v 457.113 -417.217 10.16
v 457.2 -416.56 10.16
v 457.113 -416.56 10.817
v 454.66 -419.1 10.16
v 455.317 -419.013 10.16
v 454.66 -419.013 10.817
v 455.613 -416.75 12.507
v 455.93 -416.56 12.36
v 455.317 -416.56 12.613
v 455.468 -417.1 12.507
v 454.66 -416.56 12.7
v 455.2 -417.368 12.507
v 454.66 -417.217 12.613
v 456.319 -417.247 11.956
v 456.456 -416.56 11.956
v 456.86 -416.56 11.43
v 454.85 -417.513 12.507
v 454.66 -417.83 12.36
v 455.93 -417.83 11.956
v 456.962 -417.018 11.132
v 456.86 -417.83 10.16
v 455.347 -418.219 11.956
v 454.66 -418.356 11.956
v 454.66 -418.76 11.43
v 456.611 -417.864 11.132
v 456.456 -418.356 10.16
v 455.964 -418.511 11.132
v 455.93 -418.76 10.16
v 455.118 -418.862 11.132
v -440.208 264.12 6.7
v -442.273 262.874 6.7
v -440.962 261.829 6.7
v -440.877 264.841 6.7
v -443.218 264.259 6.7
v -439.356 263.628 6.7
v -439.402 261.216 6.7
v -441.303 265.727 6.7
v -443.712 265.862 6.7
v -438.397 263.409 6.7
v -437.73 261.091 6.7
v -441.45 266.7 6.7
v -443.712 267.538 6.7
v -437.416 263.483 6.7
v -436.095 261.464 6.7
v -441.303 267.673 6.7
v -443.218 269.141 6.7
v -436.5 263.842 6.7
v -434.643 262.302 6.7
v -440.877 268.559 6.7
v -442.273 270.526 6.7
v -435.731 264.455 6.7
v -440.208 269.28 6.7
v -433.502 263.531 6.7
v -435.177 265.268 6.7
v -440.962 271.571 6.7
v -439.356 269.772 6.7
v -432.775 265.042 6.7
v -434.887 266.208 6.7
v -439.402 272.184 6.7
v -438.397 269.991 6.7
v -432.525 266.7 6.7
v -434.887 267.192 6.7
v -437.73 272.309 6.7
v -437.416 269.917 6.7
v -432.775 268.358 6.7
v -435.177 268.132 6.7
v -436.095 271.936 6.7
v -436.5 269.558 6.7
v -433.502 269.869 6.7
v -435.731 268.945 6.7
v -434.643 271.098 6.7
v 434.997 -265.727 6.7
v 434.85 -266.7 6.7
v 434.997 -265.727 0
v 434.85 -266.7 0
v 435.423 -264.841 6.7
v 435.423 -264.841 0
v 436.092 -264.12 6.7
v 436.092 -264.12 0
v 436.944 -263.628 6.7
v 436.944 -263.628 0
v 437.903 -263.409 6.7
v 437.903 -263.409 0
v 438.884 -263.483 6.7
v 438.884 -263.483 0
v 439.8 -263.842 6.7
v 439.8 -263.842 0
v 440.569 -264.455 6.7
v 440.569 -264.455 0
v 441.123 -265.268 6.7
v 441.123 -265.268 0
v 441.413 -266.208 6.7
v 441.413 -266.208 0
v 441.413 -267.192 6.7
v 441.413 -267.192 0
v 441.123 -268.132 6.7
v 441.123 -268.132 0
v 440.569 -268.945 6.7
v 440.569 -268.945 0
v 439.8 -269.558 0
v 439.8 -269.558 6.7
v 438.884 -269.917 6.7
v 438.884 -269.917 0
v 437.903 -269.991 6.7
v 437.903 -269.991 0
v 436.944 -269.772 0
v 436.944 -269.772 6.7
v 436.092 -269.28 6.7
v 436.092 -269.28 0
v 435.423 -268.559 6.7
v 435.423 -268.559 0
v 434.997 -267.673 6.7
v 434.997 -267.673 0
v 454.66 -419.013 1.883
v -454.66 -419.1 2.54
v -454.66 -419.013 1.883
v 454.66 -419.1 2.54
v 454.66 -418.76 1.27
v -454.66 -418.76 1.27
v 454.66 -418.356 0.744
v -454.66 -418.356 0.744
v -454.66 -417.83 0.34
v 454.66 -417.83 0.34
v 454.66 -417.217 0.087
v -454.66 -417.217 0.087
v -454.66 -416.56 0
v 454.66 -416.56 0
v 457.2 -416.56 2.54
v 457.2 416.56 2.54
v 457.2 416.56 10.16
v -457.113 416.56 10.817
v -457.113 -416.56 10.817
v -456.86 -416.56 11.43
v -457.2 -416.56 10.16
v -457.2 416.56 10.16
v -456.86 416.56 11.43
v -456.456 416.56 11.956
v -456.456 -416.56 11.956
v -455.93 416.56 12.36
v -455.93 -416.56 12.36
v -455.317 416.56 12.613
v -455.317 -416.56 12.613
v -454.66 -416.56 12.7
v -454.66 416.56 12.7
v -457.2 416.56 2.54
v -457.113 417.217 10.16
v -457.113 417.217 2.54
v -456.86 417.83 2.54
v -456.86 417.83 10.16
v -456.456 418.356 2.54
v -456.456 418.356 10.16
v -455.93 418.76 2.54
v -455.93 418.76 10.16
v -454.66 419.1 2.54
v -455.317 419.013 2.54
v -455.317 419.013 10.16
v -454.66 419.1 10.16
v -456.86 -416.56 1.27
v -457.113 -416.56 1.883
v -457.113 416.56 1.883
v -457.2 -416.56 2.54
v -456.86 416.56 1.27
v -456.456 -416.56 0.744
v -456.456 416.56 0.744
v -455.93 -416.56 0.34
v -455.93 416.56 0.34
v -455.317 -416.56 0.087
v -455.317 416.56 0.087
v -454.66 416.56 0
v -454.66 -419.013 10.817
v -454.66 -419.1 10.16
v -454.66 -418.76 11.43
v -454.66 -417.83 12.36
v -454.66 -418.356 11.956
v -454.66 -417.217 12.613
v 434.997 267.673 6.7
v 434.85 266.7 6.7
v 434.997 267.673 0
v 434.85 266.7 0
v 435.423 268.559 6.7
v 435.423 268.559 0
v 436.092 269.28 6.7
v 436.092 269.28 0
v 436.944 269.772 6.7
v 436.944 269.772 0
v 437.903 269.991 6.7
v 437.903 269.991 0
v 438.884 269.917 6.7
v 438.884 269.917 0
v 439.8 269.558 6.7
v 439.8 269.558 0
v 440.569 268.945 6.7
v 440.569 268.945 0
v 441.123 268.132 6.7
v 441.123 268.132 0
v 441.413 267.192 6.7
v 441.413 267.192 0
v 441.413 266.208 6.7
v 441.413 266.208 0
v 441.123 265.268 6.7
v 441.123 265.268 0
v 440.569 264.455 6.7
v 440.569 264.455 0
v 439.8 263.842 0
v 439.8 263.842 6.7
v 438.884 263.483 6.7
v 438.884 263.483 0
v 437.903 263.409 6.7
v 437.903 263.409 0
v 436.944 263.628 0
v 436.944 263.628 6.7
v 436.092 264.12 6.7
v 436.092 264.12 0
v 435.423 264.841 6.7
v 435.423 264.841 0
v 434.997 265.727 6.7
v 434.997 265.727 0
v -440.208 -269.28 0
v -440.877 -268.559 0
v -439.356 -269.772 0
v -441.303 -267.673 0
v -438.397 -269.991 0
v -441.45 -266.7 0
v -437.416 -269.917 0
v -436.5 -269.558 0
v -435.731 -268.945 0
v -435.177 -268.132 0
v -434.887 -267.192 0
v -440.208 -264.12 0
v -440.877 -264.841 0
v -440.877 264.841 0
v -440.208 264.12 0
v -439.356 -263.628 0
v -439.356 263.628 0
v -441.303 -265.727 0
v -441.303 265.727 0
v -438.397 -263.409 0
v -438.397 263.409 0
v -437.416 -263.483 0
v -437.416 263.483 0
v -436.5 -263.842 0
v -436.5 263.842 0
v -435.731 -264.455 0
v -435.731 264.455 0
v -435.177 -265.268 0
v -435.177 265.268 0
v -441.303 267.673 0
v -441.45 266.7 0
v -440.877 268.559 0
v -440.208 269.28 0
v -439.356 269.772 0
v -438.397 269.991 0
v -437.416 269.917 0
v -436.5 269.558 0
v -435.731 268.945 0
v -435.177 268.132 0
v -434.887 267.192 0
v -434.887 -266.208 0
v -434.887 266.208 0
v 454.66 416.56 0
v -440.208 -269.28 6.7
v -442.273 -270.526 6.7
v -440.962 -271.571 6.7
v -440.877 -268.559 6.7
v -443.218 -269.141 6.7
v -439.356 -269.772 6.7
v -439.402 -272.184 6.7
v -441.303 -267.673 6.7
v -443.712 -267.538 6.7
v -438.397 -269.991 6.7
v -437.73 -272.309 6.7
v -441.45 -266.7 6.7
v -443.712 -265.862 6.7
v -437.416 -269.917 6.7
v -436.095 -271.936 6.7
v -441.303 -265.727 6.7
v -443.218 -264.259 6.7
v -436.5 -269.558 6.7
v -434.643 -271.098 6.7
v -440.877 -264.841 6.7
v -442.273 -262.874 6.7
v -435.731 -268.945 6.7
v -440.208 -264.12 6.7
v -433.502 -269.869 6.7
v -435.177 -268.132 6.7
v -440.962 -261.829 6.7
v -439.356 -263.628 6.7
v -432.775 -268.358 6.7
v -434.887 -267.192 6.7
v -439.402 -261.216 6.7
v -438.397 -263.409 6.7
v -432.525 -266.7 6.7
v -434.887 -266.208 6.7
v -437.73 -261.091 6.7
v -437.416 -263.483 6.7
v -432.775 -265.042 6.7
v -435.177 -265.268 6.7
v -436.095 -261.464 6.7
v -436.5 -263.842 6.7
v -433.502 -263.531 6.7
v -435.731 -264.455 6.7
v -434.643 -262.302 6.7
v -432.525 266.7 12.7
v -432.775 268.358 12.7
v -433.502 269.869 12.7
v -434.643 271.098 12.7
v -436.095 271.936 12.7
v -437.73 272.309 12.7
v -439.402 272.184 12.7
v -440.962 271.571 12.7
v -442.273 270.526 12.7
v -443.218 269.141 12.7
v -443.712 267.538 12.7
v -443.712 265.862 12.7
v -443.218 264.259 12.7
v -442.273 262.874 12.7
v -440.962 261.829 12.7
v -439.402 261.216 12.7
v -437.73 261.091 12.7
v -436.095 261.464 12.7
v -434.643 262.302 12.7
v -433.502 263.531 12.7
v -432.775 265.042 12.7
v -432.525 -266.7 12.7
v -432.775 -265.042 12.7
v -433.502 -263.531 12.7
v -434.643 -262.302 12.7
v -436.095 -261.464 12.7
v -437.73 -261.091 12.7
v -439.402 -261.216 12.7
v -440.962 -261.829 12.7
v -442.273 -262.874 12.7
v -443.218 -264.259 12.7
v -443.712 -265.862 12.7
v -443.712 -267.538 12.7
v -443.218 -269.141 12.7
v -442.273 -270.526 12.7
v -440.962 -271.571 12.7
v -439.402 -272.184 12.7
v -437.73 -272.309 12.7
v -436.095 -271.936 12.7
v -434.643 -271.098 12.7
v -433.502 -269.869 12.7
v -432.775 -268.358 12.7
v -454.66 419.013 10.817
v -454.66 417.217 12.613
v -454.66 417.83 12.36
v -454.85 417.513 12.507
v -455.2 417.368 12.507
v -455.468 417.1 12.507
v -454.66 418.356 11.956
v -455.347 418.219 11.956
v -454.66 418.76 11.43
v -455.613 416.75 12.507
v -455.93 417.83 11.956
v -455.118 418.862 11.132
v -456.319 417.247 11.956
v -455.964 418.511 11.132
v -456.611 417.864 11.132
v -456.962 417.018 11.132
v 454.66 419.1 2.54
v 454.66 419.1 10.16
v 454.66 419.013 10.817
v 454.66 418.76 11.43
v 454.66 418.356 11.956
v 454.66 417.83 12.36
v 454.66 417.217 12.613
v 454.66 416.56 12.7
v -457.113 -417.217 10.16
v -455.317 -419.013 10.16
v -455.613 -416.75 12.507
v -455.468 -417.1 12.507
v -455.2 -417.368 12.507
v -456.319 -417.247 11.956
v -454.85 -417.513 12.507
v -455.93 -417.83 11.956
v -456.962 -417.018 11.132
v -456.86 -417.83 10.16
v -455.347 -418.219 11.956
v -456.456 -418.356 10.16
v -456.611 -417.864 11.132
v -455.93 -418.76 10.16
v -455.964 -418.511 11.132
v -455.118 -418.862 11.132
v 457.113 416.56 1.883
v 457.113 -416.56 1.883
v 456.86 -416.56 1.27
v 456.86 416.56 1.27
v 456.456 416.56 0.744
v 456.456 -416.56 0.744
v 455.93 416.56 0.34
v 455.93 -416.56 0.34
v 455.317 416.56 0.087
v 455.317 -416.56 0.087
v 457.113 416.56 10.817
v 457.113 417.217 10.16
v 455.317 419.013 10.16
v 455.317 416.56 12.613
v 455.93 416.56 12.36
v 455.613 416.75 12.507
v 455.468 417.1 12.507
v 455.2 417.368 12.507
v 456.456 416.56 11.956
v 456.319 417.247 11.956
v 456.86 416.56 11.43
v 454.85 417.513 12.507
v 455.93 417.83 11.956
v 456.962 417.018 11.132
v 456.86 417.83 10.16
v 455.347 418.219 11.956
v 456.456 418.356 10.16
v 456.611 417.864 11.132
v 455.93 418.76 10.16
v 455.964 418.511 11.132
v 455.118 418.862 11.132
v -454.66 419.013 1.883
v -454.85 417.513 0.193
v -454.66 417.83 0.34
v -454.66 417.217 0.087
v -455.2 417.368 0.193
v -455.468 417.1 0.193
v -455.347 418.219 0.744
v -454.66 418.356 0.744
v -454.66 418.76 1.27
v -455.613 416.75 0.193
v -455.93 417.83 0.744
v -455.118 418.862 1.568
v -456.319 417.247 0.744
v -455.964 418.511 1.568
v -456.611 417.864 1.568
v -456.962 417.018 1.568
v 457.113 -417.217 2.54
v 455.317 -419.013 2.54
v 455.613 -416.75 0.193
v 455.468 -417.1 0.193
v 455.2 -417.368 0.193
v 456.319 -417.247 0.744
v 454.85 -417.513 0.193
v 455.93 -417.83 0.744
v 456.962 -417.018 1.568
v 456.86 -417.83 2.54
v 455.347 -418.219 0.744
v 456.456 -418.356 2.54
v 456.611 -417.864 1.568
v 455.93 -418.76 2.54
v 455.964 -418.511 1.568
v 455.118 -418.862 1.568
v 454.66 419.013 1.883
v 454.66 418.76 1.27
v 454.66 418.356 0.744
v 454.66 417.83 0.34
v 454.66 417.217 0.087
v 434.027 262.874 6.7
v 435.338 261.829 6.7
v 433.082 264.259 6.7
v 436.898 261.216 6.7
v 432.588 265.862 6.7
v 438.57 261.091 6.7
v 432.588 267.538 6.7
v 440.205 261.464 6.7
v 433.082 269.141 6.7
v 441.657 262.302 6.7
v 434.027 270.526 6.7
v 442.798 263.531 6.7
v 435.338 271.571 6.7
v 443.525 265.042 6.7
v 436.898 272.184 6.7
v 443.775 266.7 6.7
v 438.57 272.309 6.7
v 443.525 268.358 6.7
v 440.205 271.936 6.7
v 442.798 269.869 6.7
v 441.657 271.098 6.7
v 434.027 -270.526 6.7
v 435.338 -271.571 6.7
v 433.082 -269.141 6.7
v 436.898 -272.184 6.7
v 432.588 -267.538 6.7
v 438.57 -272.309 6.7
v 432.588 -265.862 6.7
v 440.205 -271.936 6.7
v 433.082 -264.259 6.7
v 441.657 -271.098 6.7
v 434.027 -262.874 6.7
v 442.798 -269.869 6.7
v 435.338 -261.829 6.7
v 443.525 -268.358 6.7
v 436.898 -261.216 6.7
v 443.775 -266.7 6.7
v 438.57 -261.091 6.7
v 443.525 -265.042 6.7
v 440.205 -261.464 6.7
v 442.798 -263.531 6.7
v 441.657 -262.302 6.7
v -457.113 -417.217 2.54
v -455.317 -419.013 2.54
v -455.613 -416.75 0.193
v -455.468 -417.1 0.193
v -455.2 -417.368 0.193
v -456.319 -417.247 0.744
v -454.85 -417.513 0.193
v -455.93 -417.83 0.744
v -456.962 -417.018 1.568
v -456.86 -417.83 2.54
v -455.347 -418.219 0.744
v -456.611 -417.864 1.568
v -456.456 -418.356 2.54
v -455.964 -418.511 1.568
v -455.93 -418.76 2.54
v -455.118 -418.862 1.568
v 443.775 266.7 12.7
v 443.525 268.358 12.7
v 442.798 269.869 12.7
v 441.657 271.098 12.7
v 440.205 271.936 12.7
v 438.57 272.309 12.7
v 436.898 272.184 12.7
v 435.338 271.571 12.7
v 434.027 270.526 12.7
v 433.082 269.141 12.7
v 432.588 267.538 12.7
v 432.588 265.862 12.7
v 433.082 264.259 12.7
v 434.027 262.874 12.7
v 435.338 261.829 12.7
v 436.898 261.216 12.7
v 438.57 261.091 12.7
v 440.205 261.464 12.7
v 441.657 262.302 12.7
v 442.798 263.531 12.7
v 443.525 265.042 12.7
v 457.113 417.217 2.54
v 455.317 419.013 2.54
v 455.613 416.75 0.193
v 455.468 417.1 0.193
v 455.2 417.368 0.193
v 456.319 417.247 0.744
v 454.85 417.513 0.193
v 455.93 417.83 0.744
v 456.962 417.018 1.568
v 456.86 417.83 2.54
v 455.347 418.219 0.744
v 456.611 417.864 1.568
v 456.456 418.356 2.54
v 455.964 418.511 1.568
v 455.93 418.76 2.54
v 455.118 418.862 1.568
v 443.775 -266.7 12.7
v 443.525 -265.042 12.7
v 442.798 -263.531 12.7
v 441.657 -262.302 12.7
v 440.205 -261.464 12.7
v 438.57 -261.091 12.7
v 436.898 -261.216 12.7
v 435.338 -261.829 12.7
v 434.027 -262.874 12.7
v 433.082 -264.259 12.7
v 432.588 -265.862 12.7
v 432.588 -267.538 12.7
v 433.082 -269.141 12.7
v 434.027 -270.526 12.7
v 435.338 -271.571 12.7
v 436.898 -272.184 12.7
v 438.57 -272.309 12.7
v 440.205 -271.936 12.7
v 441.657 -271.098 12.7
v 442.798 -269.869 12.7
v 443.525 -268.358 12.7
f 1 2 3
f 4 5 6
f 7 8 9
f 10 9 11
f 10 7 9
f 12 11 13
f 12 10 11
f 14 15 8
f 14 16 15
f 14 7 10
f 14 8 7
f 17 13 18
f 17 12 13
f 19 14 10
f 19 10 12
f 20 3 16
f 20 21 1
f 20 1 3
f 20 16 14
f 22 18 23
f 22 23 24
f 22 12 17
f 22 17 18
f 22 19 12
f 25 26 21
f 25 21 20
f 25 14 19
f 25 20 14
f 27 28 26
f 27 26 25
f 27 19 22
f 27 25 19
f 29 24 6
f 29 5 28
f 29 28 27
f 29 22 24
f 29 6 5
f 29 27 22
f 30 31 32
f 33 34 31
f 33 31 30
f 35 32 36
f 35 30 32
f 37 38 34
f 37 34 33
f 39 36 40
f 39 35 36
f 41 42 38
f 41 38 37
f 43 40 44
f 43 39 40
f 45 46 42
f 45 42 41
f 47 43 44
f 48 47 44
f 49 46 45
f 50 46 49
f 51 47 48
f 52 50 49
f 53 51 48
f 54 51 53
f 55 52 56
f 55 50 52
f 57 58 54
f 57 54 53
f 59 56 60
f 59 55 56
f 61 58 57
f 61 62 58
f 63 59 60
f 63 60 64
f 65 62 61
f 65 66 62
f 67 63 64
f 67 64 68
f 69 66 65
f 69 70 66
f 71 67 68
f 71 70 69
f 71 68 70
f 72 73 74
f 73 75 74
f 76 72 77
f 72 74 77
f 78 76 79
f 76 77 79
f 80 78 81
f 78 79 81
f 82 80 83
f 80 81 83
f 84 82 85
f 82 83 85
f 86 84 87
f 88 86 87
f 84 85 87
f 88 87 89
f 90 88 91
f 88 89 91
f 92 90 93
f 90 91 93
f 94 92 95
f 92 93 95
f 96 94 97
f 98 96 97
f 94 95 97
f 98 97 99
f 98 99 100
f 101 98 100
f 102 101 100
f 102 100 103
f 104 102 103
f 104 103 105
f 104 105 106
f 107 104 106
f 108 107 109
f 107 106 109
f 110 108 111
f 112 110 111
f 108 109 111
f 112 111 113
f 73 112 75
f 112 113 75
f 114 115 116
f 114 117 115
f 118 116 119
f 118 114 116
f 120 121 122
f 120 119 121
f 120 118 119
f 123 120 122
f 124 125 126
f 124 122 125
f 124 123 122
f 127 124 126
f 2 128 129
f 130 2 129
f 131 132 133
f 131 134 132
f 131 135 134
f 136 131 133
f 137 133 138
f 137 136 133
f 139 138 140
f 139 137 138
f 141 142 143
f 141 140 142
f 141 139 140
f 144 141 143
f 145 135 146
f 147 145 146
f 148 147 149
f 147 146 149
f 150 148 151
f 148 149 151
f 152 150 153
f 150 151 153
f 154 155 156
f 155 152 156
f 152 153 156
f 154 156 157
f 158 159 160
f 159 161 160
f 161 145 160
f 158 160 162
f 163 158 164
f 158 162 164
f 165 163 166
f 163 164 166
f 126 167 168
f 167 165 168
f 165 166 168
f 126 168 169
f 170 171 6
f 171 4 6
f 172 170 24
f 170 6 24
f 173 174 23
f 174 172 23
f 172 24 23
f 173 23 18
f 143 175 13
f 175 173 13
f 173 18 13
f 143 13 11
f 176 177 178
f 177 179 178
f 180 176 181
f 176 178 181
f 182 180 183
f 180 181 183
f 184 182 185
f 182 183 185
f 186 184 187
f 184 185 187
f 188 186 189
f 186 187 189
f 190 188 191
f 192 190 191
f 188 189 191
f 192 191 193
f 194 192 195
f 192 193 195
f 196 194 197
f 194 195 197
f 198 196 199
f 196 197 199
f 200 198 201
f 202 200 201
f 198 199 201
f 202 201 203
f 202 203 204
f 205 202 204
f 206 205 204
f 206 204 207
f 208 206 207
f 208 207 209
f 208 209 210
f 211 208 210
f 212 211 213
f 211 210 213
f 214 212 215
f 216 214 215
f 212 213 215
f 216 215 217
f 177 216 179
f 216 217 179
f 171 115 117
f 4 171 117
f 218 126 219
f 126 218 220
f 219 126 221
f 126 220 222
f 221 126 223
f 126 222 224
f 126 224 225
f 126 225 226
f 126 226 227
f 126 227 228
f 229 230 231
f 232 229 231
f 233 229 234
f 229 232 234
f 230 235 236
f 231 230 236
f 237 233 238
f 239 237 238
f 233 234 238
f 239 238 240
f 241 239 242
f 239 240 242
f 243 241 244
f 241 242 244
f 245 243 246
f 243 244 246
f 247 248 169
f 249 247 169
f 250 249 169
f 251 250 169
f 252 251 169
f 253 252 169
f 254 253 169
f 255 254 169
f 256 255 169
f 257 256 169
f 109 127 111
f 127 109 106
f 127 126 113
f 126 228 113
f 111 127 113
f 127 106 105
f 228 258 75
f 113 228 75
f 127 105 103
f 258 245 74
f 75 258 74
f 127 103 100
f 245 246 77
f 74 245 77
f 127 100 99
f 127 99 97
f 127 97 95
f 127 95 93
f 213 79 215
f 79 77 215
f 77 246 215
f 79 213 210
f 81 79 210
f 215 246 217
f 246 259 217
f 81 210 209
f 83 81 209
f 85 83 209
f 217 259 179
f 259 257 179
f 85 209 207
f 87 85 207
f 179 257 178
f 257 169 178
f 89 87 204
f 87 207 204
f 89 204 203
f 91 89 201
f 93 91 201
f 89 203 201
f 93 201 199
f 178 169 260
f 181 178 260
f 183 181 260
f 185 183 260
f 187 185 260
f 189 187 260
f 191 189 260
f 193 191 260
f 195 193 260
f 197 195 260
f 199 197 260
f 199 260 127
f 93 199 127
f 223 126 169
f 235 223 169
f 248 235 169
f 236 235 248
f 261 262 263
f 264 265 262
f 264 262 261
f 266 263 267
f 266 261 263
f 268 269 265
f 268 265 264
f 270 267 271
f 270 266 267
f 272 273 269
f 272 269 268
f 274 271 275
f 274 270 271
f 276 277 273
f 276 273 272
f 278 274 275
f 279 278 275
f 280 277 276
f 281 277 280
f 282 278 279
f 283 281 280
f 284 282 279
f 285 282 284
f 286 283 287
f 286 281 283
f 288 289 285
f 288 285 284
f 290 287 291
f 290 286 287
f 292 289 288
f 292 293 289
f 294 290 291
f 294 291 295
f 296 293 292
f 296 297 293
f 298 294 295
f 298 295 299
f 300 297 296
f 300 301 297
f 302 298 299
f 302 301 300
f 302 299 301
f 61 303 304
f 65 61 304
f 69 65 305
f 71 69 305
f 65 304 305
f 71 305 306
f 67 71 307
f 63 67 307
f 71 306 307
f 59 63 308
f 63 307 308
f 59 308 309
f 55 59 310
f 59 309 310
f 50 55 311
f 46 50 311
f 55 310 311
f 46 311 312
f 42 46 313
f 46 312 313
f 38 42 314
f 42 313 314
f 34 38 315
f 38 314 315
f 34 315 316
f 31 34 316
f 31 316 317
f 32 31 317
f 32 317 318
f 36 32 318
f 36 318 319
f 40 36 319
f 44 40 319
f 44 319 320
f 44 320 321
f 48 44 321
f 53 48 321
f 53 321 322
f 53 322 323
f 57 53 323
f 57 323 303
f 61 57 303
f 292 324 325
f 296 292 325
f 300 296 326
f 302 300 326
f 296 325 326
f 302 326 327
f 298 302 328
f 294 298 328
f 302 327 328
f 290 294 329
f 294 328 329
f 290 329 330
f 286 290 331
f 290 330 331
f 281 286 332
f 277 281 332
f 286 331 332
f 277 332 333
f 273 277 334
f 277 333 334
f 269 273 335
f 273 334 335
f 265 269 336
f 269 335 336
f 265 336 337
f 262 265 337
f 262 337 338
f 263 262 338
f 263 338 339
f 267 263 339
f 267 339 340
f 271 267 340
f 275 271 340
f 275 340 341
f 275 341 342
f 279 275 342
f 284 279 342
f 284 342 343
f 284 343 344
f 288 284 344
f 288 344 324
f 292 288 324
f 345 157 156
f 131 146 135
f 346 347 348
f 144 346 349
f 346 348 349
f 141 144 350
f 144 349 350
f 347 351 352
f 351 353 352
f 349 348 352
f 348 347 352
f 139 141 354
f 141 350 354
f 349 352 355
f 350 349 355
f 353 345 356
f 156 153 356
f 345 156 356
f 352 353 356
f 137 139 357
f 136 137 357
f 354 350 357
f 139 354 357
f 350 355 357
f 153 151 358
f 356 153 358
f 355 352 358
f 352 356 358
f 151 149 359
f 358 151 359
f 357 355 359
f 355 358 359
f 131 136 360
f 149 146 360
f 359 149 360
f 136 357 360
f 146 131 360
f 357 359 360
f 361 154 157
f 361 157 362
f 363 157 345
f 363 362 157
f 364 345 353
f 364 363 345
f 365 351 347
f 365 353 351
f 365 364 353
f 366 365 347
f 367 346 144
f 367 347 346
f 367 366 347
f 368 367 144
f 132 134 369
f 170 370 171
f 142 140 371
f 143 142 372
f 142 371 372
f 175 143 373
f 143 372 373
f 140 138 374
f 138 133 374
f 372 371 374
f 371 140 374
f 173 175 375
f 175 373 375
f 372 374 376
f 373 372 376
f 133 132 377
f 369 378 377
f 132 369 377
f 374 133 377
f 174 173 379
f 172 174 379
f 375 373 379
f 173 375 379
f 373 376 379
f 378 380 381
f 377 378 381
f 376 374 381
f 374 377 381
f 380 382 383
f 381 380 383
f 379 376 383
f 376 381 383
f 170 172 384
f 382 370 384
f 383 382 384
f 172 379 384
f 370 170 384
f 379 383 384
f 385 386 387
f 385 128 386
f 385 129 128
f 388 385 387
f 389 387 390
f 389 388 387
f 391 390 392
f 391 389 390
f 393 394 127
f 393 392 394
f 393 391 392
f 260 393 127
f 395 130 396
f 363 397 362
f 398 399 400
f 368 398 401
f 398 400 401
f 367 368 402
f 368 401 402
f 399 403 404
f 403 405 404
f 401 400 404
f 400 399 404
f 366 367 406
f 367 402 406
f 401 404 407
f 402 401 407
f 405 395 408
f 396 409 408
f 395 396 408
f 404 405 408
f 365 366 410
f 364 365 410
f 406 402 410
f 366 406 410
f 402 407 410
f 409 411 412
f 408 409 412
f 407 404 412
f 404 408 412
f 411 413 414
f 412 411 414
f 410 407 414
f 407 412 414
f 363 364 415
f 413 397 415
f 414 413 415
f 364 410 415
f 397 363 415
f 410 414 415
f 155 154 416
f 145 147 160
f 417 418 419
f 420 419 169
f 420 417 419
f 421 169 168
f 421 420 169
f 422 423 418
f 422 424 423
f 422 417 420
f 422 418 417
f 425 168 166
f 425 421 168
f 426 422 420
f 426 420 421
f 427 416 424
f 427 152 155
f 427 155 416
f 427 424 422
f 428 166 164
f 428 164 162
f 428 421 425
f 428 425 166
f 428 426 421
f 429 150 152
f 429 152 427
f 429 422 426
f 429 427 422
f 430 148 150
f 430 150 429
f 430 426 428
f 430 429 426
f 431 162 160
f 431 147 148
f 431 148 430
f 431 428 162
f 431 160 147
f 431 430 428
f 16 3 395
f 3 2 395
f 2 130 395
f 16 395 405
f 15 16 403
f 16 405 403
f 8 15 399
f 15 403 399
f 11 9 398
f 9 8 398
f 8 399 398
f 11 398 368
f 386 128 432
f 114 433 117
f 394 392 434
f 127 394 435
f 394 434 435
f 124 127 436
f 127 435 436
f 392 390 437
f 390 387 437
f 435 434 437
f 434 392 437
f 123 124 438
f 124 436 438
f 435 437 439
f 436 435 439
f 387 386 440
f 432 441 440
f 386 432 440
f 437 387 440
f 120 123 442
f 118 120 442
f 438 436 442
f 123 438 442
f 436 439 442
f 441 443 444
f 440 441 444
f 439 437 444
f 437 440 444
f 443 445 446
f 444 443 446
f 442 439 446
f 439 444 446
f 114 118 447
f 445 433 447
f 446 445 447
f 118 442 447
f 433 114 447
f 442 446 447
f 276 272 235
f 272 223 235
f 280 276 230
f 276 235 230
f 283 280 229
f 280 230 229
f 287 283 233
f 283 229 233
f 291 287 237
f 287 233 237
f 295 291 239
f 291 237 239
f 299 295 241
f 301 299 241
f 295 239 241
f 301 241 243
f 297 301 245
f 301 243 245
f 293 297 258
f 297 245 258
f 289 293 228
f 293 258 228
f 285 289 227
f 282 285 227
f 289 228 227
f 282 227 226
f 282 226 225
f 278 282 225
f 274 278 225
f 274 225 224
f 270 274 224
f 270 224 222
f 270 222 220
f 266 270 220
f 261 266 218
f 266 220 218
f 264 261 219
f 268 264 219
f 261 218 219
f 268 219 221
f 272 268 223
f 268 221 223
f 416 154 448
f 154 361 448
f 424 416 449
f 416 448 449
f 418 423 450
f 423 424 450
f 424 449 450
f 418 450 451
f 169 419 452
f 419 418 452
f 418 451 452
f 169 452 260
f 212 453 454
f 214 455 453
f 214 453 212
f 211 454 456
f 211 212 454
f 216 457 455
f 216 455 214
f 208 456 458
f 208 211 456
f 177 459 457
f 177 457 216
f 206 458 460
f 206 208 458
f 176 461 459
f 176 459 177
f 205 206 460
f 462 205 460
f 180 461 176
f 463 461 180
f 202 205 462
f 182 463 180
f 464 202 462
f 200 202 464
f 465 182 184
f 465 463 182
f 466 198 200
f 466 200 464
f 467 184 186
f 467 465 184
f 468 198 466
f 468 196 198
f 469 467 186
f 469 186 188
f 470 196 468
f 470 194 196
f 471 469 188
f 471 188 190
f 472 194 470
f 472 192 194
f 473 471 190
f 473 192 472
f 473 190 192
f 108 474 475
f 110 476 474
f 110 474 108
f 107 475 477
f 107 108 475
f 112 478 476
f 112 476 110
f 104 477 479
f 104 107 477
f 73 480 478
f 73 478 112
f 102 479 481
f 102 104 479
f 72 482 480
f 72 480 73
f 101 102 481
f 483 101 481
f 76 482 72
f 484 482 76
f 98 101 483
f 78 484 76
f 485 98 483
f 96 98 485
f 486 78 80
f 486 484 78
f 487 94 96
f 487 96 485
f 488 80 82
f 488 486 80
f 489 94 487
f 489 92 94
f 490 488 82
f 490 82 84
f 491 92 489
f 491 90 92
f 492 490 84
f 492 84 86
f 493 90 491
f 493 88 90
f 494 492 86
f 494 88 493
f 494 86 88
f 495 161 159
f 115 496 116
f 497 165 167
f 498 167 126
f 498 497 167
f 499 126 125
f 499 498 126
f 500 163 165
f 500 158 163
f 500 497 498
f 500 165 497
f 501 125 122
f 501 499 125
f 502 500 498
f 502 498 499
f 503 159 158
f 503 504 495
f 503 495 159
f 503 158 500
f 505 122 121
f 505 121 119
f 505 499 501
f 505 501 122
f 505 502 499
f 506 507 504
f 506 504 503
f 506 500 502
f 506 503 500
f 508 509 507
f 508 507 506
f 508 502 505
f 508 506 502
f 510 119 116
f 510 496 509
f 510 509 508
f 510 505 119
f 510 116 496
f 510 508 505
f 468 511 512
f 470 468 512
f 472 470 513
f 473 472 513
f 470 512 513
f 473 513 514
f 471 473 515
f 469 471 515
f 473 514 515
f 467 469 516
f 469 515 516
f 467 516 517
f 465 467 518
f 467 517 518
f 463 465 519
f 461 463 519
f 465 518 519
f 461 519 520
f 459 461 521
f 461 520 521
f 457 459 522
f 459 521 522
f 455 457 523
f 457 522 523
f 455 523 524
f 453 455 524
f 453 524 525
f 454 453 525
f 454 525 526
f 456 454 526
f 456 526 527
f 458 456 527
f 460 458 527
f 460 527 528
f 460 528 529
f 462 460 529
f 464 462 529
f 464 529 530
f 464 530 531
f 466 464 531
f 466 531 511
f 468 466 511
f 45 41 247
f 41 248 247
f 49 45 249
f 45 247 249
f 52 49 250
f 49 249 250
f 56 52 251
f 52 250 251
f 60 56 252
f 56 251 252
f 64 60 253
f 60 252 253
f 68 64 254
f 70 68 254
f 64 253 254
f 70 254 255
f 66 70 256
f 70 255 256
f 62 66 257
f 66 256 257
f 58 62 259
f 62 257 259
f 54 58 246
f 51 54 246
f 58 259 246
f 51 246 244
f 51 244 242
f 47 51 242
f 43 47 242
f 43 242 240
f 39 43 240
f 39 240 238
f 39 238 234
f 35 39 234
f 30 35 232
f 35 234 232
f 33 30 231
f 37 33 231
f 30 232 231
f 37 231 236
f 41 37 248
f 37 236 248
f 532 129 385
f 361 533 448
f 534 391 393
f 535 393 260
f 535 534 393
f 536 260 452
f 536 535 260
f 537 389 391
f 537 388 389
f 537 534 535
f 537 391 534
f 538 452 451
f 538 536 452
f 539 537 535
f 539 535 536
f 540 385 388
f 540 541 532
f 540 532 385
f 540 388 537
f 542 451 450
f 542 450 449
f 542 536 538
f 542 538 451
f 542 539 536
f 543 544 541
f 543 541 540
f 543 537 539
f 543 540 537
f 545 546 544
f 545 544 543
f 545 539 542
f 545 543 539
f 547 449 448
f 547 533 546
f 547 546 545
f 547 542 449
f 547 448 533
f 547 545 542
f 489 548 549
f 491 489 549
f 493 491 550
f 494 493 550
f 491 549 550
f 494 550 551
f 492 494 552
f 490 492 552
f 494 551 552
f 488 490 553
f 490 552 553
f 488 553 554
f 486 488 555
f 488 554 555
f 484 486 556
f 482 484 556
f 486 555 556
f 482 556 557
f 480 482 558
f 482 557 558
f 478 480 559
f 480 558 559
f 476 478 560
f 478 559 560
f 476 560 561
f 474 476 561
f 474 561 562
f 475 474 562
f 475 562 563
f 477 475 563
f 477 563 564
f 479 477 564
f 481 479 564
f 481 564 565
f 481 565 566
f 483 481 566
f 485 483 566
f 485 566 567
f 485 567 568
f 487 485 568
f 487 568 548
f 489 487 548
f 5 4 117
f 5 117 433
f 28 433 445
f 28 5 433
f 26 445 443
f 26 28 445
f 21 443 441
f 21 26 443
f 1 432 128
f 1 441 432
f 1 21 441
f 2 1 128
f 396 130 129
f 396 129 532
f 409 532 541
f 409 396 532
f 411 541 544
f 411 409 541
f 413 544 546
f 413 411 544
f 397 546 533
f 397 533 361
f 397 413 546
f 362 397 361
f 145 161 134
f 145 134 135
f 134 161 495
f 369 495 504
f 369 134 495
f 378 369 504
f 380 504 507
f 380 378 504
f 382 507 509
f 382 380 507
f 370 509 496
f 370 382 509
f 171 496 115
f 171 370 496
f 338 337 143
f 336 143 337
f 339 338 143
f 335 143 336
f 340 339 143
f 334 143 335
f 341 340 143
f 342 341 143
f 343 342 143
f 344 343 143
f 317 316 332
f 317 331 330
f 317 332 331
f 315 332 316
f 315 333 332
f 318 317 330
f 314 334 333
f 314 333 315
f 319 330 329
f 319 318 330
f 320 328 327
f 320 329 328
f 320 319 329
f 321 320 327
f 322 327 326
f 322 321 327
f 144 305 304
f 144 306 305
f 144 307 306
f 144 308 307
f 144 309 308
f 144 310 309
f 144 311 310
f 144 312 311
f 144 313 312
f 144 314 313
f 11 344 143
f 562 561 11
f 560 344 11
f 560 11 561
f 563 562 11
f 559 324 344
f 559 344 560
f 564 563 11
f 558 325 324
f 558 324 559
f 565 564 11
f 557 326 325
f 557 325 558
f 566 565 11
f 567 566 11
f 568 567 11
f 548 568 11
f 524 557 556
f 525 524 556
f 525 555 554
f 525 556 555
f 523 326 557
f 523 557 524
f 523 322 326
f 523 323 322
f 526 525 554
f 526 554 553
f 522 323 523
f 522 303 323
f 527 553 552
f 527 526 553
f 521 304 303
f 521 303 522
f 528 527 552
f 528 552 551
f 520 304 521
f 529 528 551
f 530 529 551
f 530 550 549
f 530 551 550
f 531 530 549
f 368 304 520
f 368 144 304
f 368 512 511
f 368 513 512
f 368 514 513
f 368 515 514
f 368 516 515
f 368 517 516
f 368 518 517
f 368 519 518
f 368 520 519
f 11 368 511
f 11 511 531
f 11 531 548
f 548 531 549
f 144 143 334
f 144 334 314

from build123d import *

# Parameters (mm, degrees)
F0_W           = 914.4
F0_H           = 838.2
F1_DEPTH       = 12.7
F3_R           = 2.54
F4_D           = 6.6
F4_CBORE_D     = 11.25
F4_CBORE_DEPTH = 6


with BuildPart() as f1:
    # F0 (on Top) → F1 (new body)
    with BuildSketch(Plane.XY):
        Rectangle(F0_W, F0_H)
    extrude(amount=F1_DEPTH)

    # F3
    f3_edges = [f1.edges().sort_by_distance(p)[0] for p in [
        (457.2, -419.1, 6.35),
        (457.2, 419.1, 6.35),
        (457.2, 0, 0),
        (457.2, 0, 12.7),
        (-457.2, 419.1, 6.35),
        (0, 419.1, 0),
        (0, 419.1, 12.7),
        (-457.2, -419.1, 6.35),
        (-457.2, 0, 0),
        (-457.2, 0, 12.7),
        (0, -419.1, 0),
        (0, -419.1, 12.7),
    ]]
    fillet(f3_edges, radius=F3_R)

    # F4 (through all)
    with Locations(Plane.XY.offset(12.7)):
        with Locations((-438.15, -266.7), (-438.15, 266.7), (438.15, 266.7), (438.15, -266.7)):
            CounterBoreHole(F4_D / 2, F4_CBORE_D / 2, F4_CBORE_DEPTH)


solid = f1.part
